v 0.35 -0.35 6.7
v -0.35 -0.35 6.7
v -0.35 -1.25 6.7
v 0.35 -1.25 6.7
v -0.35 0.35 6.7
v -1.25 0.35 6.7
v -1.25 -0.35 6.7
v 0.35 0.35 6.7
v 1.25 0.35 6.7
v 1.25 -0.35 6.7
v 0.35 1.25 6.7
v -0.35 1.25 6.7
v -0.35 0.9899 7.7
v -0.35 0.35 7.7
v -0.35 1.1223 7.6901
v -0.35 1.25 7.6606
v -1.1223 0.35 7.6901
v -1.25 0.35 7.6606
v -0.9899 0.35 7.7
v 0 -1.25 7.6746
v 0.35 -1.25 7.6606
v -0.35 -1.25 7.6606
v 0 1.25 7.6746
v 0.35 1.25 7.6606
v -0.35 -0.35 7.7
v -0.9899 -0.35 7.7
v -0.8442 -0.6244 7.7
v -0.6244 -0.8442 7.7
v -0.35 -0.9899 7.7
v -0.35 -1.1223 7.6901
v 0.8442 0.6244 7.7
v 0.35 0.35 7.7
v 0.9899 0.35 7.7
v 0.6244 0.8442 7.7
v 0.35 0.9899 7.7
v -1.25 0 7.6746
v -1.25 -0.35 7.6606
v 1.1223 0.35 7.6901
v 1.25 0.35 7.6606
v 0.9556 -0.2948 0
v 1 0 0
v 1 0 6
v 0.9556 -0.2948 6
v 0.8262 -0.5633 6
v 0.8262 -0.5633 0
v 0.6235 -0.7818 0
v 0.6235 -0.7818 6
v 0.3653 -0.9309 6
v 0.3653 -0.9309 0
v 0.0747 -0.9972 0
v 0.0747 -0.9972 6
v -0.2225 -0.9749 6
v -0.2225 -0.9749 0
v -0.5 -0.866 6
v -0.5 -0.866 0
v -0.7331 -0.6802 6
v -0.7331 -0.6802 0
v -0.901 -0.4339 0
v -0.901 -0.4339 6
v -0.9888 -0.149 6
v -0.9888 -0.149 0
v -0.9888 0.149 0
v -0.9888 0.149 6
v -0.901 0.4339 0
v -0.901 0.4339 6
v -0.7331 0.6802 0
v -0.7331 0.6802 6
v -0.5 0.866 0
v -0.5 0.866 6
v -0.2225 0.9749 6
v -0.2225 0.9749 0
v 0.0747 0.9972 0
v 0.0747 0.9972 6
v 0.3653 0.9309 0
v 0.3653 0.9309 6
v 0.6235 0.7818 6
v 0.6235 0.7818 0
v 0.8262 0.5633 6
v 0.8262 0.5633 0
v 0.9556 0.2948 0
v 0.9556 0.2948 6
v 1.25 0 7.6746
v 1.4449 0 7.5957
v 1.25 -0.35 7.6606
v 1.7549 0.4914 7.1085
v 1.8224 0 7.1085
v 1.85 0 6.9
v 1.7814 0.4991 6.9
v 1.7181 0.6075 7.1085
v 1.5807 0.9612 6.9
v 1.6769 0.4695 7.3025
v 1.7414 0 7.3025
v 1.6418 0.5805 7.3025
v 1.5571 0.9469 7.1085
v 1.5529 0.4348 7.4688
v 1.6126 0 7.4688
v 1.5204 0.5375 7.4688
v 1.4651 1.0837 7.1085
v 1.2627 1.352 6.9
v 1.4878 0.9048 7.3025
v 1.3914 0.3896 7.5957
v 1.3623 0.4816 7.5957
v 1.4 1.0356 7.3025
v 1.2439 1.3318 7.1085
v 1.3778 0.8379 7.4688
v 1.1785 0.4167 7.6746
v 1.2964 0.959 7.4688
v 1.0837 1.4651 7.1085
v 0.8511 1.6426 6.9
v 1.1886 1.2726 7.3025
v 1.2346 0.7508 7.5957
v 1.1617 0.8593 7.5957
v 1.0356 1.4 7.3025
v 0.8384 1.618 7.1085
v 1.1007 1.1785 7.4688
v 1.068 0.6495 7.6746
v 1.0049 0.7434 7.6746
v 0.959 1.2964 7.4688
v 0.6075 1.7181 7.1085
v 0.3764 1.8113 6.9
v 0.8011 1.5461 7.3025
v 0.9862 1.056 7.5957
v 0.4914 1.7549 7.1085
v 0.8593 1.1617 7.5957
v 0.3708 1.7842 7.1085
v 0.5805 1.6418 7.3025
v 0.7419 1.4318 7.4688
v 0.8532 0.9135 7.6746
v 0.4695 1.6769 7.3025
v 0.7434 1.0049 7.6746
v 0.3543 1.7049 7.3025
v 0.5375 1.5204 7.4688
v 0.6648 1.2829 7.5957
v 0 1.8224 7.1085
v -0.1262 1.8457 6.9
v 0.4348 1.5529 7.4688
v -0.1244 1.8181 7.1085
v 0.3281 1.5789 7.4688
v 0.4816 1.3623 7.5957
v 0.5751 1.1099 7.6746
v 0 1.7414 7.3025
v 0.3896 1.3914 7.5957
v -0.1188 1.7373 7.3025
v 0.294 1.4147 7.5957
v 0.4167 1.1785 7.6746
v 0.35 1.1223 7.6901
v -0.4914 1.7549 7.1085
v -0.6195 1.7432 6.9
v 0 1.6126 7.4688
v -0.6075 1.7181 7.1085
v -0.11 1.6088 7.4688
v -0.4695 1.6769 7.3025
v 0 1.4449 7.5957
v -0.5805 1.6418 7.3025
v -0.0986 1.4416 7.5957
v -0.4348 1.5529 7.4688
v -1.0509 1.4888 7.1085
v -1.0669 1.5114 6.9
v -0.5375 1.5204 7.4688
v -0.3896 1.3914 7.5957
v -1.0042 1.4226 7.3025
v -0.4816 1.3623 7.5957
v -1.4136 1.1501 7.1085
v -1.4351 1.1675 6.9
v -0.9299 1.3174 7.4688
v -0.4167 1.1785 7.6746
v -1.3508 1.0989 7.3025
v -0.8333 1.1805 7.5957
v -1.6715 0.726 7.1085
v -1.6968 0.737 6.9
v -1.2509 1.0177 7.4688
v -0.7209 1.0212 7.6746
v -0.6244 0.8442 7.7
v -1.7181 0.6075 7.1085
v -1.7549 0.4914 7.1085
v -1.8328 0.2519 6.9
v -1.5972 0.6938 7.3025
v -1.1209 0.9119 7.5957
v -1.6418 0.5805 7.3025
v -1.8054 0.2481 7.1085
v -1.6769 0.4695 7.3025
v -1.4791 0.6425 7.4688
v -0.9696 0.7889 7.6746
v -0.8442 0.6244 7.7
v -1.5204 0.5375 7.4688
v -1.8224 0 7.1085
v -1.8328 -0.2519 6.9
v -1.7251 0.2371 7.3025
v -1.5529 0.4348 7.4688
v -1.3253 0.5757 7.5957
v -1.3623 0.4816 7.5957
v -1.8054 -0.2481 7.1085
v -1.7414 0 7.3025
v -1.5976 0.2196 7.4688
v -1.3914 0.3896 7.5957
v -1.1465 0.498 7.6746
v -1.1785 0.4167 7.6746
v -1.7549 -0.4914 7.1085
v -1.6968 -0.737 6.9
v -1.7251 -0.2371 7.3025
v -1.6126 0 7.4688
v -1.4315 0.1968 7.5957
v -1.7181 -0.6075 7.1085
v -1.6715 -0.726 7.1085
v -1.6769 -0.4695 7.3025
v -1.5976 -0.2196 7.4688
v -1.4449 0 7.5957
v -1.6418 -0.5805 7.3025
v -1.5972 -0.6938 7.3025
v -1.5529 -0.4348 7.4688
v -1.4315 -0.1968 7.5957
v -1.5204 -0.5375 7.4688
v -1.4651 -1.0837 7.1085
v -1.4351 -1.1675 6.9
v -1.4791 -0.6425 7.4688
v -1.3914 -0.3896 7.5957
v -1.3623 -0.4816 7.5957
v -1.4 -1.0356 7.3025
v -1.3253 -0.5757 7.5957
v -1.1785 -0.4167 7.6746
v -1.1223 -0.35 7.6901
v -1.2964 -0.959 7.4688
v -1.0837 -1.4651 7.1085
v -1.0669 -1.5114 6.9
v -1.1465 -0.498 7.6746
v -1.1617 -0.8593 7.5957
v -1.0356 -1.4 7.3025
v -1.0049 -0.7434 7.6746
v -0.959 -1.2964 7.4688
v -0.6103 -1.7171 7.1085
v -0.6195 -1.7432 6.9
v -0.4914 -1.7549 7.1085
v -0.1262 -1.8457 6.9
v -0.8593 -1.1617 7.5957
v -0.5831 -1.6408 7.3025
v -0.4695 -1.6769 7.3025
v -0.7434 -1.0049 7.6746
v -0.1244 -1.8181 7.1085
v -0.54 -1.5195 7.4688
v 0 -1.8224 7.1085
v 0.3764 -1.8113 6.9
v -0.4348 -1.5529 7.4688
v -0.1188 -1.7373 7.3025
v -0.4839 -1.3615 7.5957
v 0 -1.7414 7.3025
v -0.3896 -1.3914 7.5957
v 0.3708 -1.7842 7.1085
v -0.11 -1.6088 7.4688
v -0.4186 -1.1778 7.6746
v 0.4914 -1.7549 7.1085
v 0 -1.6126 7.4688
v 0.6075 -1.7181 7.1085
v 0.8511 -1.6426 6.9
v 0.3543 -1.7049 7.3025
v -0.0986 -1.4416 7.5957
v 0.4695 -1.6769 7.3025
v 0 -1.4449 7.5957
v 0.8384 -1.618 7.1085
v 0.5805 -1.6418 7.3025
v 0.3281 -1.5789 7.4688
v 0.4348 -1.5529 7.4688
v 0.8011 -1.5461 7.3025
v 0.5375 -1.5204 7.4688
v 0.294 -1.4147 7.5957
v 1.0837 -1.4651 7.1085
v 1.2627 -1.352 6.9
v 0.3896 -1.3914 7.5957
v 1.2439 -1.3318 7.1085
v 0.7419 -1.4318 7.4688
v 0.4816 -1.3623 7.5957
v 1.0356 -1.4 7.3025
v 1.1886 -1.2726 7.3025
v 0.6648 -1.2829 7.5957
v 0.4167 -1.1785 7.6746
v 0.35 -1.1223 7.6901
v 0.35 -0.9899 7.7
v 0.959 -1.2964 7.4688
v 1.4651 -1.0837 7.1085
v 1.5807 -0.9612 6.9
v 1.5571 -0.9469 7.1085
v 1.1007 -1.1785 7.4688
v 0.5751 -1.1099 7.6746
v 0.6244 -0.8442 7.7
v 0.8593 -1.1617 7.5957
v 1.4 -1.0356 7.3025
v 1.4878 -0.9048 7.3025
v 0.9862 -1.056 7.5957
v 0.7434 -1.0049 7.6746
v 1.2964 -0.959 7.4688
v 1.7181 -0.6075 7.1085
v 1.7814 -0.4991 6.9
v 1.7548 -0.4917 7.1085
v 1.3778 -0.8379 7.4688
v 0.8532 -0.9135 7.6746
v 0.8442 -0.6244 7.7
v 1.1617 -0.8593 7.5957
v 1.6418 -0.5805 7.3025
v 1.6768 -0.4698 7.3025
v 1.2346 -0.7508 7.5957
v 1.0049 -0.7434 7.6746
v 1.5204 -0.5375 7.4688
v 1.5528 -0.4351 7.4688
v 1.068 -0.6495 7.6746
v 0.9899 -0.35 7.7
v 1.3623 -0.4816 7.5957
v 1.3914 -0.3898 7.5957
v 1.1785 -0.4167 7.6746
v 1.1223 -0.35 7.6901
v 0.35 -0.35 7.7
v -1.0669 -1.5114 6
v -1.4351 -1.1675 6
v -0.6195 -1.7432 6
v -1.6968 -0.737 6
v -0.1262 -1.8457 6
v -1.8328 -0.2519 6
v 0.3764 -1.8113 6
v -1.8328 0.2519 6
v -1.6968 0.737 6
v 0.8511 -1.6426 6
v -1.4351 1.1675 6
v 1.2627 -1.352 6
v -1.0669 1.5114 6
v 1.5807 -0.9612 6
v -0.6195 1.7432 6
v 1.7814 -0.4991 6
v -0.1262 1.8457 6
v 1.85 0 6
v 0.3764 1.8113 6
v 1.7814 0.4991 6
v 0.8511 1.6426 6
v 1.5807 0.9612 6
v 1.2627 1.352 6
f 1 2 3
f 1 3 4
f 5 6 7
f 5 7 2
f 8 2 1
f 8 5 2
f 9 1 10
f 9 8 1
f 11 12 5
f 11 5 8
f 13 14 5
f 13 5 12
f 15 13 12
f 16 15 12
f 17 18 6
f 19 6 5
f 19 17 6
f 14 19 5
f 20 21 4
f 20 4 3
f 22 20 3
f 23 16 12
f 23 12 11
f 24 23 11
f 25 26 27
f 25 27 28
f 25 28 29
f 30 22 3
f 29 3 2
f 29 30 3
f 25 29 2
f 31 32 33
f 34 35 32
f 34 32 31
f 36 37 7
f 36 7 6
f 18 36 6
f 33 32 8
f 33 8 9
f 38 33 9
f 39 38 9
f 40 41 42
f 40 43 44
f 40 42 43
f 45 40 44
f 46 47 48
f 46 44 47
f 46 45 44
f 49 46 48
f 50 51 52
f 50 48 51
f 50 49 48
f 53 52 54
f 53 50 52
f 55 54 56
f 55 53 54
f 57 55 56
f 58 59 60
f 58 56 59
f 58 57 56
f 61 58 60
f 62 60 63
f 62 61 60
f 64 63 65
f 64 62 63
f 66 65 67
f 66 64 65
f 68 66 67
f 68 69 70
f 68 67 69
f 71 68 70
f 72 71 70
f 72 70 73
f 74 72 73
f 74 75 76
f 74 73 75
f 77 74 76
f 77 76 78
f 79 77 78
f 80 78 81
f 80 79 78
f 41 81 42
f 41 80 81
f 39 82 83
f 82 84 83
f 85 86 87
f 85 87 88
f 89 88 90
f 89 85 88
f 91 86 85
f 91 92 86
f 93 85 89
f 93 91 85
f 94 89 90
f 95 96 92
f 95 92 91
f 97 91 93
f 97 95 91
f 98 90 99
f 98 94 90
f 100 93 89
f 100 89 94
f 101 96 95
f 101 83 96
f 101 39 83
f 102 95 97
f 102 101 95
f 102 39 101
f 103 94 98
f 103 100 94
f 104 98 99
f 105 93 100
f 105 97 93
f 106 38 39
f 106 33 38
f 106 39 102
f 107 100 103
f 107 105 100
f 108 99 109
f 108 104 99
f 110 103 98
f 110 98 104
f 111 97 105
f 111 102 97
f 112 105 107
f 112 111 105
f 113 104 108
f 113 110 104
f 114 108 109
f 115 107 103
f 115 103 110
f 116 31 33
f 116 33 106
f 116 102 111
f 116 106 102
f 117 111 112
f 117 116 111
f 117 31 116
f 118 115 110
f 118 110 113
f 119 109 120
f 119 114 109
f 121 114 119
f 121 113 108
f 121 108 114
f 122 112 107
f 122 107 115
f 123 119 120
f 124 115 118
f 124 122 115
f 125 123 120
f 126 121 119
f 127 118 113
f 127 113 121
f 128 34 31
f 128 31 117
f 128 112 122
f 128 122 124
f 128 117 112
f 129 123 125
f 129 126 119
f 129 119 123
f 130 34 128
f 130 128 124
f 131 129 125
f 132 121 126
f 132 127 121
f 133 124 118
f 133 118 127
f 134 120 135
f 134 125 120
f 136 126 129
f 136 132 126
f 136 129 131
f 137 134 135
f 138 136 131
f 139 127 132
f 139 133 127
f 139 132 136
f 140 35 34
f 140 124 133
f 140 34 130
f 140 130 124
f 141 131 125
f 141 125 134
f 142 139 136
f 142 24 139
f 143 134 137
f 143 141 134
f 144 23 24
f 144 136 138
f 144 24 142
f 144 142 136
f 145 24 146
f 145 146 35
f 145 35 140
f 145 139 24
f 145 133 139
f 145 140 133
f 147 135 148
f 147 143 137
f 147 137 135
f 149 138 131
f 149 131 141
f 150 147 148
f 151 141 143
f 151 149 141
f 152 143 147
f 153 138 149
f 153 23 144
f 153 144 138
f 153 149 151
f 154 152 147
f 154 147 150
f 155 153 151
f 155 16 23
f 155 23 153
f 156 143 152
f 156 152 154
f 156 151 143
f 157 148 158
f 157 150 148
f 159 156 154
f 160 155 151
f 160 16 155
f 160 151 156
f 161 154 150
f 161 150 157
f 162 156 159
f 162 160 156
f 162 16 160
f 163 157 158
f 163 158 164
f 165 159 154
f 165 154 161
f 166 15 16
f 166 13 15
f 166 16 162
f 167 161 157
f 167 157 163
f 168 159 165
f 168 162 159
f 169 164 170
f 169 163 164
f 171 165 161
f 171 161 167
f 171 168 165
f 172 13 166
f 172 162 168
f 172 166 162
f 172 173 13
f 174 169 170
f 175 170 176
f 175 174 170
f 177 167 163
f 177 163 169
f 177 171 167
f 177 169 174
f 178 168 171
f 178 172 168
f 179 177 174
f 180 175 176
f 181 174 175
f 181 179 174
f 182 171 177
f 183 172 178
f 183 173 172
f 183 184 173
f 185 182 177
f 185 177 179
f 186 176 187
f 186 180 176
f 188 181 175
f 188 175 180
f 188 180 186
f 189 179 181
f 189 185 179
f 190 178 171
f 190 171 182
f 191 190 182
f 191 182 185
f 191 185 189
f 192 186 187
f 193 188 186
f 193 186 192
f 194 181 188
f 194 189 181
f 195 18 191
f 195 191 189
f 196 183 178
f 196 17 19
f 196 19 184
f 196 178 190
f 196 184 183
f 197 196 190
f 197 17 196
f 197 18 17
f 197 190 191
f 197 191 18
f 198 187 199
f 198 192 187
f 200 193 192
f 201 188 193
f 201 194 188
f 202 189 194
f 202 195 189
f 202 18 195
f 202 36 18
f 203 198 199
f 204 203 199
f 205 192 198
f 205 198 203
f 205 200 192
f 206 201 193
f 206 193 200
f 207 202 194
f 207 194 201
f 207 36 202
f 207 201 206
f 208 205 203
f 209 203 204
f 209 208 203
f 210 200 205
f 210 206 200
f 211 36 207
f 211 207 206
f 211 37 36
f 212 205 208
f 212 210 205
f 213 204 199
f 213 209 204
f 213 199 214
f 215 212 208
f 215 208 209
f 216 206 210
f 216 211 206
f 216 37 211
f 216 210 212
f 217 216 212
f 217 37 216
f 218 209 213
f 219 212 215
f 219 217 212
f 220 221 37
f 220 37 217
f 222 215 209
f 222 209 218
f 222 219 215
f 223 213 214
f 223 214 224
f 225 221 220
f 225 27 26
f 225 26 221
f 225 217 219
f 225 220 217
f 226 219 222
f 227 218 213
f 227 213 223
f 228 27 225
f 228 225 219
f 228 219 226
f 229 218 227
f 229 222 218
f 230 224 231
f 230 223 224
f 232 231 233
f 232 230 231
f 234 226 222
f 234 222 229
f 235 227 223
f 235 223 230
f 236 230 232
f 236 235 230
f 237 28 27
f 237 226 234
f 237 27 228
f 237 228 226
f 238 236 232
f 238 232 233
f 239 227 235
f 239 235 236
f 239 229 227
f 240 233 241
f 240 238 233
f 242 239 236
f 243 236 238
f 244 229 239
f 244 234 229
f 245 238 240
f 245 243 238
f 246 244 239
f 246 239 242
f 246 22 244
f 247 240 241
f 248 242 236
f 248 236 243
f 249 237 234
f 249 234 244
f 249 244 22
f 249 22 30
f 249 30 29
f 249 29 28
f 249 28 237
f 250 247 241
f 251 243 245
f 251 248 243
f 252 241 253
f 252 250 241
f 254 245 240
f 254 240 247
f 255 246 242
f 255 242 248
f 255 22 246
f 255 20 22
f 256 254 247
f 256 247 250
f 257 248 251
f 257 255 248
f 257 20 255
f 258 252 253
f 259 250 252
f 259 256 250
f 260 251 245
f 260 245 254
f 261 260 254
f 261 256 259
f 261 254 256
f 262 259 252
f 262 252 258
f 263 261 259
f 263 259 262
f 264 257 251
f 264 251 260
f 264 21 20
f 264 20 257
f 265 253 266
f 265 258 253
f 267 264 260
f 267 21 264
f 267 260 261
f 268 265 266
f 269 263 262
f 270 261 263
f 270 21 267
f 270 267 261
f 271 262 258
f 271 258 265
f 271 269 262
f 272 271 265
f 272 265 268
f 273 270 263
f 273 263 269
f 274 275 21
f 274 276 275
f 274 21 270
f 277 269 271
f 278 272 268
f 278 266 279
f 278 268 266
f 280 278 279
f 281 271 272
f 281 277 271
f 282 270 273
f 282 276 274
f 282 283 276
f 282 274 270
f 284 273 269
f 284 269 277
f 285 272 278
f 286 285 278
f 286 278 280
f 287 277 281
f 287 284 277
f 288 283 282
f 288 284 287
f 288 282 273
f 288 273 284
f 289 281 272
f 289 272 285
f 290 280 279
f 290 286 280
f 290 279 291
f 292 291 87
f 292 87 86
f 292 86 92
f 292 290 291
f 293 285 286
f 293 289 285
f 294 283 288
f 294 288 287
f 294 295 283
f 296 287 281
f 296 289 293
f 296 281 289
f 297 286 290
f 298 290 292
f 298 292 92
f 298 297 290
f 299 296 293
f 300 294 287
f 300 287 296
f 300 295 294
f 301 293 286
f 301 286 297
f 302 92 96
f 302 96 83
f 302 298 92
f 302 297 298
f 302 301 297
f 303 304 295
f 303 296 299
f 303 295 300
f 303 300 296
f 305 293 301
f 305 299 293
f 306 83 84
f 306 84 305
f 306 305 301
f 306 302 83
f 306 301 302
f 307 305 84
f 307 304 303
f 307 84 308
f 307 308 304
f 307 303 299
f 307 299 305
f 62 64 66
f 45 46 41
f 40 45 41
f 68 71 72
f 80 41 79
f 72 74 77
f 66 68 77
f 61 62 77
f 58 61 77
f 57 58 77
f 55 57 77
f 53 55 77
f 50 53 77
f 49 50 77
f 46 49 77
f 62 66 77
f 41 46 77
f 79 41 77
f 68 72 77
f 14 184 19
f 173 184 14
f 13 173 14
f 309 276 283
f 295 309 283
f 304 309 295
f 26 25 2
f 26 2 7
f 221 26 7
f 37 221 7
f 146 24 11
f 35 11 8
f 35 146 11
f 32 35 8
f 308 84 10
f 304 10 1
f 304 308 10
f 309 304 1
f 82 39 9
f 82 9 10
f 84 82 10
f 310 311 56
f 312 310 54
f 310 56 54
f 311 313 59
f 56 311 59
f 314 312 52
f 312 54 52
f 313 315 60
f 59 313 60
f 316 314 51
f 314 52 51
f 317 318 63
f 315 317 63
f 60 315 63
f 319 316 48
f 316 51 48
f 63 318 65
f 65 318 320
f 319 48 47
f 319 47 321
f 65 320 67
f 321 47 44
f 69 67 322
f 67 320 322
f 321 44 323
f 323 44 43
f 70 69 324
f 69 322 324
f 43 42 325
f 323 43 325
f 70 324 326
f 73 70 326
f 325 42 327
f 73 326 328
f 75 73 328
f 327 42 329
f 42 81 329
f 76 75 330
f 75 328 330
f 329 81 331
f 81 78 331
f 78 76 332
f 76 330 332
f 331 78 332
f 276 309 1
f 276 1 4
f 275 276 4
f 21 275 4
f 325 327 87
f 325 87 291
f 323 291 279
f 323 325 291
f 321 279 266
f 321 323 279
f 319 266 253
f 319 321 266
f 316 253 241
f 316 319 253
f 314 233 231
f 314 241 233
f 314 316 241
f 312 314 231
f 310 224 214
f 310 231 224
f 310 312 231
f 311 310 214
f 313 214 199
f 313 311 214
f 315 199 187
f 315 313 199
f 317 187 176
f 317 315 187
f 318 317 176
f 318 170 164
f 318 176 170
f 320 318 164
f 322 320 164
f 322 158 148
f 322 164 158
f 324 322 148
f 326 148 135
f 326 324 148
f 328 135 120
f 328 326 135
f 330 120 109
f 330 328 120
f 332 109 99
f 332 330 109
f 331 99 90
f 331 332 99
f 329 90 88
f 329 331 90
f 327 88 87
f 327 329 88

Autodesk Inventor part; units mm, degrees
ref_plane "YZ Plane" through (0, 0, 0) normal (1, 0, 0) x (0, 1, 0)
ref_plane "XZ Plane" through (0, 0, 0) normal (0, 1, 0) x (-1, 0, 0)
ref_plane "XY Plane" through (0, 0, 0) normal (0, 0, 1) x (1, 0, 0)
sketch "Sketch1" plane through (0, 0, 0) normal (0, 0, 1) x (1, 0, 0)
  circle A0 centre (0, 0) radius 1
  dimension "d0" = 2
extrude "Extrusion1" add sketch "Sketch1" along normal blind 6
thread "Thread1" size "M2x0.4" class "6g" standard "ANSI Metric M Profile" full length
sketch "Sketch2" plane through (0, 0, 6) normal (0, 0, 1) x (1, 0, 0)
  circle A0 centre (0, 0) radius 1 projected
  circle A1 centre (0, 0) radius 1.85
  dimension "d6" = 3.7
extrude "Extrusion2" add sketch "Sketch2" along normal blind 1.7 contours A0 | A1
fillet "Fillet1" radius 0.8 1 edges at (-1.85, 0, 7.7)
sketch "Sketch3" plane through (0, 0, 7.7) normal (0, 0, 1) x (1, 0, 0)
  circle A0 centre (0, 0) radius 1.05 projected
  line L0 (-0.35, 1.25) -> (0.35, 1.25)
  line L1 (0.35, 1.25) -> (0.35, -1.25)
  line L2 (0.35, -1.25) -> (-0.35, -1.25)
  line L3 (-0.35, -1.25) -> (-0.35, 1.25)
  line L4 (-1.25, 0.35) -> (1.25, 0.35)
  line L5 (1.25, 0.35) -> (1.25, -0.35)
  line L6 (1.25, -0.35) -> (-1.25, -0.35)
  line L7 (-1.25, -0.35) -> (-1.25, 0.35)
  point P0 (0, 1.25)
  point P1 (0.35, 0)
  point P2 (-1.25, 0)
  point P3 (0, 0.35)
  dimension "d11" = 0.7
  dimension "d15" = 2.5
  dimension "d16" = 0.7
  dimension "d17" = 2.5
extrude "Extrusion3" cut sketch "Sketch3" against normal blind 1 contours A0 L6 L1 L4 | A0 L4 L5 L6 | L1 L4 L3 A0 | A0 L3 L0 L1 | L1 L6 L3 L4 | L1 L2 L3 A0 | A0 L3 L6 L1 | L3 L6 A0 L4 | A0 L6 L7 L4
equation "\"d16\" = d11"
equation "\"d17\" = d15"
properties part number "M2x6 Screw"
